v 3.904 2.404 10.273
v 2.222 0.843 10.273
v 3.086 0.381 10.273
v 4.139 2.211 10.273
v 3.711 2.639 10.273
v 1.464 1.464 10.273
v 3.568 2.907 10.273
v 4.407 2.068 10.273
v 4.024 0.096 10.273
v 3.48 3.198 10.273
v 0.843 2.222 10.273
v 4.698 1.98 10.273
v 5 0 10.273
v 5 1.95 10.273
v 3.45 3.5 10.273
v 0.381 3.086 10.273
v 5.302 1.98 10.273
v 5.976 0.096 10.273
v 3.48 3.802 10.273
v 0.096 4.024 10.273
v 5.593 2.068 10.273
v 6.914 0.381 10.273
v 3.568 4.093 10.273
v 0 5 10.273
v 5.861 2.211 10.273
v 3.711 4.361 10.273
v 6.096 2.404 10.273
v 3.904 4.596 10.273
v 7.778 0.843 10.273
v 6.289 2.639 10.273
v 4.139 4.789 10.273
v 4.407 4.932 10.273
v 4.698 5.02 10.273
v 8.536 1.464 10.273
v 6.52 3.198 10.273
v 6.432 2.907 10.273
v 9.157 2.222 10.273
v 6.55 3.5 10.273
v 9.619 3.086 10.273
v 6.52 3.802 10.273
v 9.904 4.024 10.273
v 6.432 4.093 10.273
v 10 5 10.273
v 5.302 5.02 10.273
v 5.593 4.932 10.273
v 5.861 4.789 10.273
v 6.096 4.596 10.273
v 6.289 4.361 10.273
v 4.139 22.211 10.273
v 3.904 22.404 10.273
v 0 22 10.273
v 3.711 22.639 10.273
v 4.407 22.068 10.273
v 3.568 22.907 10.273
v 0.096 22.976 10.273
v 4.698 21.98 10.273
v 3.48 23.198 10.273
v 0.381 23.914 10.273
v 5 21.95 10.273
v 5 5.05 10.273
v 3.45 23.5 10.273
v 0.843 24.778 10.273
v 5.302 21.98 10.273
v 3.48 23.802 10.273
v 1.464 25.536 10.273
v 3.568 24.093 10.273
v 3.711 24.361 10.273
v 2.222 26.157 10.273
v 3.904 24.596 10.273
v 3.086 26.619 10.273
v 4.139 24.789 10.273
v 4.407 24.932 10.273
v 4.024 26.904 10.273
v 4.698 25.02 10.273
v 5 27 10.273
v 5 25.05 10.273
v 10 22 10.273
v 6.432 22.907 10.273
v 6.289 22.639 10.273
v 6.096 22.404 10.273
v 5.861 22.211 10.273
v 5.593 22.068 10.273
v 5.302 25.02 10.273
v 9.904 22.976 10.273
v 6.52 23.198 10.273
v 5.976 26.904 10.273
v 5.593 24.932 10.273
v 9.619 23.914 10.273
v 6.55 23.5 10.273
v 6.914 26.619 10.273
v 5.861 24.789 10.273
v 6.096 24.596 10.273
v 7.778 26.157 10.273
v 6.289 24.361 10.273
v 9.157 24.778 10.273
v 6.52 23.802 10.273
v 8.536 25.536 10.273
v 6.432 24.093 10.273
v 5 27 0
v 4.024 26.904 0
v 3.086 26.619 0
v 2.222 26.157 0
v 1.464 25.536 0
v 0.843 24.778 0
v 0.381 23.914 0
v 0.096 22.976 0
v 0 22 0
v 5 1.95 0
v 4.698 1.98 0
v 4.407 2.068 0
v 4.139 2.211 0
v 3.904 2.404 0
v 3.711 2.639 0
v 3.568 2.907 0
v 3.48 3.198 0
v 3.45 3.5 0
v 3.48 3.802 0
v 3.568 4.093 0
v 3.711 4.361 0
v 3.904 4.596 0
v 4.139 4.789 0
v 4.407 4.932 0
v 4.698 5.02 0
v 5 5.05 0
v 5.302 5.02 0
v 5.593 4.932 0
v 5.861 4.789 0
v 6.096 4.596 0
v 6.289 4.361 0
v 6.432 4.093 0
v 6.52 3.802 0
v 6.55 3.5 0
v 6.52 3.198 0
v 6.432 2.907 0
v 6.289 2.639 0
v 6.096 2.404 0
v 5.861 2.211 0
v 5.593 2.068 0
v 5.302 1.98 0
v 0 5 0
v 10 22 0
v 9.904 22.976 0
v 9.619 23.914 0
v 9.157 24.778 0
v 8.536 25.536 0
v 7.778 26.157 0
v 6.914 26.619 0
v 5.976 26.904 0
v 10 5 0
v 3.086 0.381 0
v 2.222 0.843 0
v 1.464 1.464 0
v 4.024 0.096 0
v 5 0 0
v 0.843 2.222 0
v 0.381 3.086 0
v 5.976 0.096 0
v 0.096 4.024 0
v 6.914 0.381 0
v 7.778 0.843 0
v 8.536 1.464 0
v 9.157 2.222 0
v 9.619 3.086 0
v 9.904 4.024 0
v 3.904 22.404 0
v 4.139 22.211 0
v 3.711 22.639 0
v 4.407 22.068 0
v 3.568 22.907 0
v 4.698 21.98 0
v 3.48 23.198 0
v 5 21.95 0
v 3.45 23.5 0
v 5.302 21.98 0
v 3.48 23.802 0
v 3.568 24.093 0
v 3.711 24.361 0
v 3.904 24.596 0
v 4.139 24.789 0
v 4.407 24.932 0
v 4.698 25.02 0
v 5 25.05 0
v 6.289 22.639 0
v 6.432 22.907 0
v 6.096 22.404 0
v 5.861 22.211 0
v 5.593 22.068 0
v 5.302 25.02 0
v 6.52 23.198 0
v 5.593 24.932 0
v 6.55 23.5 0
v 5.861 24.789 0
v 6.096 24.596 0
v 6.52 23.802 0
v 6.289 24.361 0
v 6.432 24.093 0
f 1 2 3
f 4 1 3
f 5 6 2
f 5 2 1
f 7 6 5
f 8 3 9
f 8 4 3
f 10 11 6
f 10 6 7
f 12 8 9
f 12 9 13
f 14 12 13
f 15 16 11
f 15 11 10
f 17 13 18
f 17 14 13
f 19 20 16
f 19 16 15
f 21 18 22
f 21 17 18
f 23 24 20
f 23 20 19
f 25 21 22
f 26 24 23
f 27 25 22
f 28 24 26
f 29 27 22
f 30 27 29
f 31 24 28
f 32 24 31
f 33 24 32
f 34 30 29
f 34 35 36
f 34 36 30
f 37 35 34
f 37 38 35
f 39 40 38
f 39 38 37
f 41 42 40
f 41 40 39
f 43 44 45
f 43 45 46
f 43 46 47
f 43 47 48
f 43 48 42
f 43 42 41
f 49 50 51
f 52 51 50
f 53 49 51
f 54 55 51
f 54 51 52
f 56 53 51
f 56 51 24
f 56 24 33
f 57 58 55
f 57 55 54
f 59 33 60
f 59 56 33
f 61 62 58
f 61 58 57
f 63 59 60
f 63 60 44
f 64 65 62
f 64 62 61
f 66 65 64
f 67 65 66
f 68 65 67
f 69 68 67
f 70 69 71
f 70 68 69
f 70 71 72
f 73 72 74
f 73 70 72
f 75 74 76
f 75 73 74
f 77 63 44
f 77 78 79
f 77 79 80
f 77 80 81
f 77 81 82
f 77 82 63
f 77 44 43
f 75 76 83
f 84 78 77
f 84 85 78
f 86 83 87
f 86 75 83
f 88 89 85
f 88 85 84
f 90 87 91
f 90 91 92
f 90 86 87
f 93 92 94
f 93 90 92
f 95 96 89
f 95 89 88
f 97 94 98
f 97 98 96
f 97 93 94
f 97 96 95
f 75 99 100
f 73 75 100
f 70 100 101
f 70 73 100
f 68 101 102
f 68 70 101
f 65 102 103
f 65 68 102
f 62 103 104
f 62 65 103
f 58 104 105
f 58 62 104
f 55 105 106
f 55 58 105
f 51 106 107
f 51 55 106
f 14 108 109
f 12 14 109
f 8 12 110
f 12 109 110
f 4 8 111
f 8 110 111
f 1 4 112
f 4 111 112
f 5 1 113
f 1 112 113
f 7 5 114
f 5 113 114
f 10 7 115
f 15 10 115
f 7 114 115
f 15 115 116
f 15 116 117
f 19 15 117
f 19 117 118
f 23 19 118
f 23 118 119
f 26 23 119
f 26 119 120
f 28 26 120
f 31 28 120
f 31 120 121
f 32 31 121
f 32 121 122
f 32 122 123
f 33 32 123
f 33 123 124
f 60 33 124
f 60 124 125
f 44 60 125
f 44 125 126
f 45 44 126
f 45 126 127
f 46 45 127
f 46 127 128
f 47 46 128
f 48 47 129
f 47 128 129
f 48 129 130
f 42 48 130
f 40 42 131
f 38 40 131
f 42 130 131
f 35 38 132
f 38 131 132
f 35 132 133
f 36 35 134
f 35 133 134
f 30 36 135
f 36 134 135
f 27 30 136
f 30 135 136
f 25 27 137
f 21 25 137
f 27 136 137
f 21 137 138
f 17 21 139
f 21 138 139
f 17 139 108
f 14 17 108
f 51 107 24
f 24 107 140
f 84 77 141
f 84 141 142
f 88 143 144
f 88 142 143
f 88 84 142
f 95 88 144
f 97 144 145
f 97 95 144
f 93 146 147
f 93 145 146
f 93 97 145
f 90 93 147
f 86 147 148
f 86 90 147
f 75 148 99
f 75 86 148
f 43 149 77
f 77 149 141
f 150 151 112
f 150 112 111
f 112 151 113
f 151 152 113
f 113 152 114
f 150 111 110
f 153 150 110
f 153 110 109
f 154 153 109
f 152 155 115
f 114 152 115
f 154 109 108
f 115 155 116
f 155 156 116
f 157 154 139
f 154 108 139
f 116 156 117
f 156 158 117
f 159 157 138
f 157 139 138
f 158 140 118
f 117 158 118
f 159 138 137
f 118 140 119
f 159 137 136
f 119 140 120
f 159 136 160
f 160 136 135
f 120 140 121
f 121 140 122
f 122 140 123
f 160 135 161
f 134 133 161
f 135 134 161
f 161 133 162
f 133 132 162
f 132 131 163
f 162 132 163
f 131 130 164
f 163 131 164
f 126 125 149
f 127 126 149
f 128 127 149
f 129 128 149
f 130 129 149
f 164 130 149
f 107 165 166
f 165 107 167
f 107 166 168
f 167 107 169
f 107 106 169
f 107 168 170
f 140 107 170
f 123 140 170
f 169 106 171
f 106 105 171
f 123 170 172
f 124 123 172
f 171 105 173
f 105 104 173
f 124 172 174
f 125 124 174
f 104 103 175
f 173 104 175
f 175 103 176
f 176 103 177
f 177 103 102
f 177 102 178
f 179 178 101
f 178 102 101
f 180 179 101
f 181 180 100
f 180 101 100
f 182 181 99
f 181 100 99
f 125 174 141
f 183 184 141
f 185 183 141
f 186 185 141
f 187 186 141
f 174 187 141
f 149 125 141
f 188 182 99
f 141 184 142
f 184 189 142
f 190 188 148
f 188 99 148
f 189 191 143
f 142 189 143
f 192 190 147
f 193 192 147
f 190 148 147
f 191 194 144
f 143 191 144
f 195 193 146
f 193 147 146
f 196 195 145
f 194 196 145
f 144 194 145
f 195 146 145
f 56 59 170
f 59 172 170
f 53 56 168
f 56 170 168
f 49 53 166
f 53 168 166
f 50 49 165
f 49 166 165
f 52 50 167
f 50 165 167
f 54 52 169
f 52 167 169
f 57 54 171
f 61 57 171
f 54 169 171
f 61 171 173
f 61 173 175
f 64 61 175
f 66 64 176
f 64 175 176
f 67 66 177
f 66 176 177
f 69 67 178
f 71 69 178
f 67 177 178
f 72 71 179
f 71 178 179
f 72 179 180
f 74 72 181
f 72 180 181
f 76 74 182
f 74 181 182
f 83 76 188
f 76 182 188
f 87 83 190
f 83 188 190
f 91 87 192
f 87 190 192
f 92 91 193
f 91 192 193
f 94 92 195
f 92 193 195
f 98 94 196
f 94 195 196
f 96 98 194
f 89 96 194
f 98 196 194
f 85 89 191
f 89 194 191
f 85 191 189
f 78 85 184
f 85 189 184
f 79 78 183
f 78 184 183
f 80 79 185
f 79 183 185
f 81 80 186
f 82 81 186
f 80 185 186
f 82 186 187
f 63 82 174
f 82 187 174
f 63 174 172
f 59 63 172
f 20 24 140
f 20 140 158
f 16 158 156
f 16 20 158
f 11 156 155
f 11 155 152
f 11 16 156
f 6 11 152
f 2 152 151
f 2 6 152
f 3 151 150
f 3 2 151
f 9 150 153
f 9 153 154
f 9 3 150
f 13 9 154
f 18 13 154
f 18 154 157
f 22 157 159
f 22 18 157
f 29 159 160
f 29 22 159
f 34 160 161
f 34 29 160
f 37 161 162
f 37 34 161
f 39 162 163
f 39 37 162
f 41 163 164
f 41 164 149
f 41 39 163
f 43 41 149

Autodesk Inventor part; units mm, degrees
ref_plane "YZ Plane" through (0, 0, 0) normal (1, 0, 0) x (0, 1, 0)
ref_plane "XZ Plane" through (0, 0, 0) normal (0, 1, 0) x (-1, 0, 0)
ref_plane "XY Plane" through (0, 0, 0) normal (0, 0, 1) x (1, 0, 0)
sketch "スケッチ1" plane through (0, 0, 0) normal (0, 0, 1) x (1, 0, 0)
  line L0 (0, 0) -> (10, 0)
  line L1 (10, 0) -> (10, 27)
  line L2 (10, 27) -> (0, 27)
  line L3 (0, 27) -> (0, 0)
  dimension "d0" = 27
  dimension "d1" = 10
extrude "押し出し1" add sketch "スケッチ1" along normal blind 10.273
sketch "スケッチ2" plane through (0, 0, 10.273) normal (0, 0, 1) x (1, 0, 0)
  line L0 (0, 27) -> (0, 0) projected
  line L1 (0, 13.5) -> (10, 13.5)
  line L2 (10, 0) -> (10, 27) projected
  line L3 (10, 27) -> (0, 27) projected
  line L4 (5, 27) -> (5, 0)
  line L5 (0, 0) -> (10, 0) projected
  line L6 (0, 27) -> (10, 27)
  point P0 (5, 23.5)
  point P1 (5, 3.5)
  dimension "d4" = 10
hole "穴1" at (5, 23.5, 10.273) at (5, 3.5, 10.273) direction (0, 0, -1) diameter 3.1 end through all
fillet "フィレット1" radius 5 4 edges at (0, 27, 5.1365) (10, 27, 5.1365) (10, 0, 5.1365) (0, 0, 5.1365)
properties part number "link1part2" material "アルミニウム 6061"
